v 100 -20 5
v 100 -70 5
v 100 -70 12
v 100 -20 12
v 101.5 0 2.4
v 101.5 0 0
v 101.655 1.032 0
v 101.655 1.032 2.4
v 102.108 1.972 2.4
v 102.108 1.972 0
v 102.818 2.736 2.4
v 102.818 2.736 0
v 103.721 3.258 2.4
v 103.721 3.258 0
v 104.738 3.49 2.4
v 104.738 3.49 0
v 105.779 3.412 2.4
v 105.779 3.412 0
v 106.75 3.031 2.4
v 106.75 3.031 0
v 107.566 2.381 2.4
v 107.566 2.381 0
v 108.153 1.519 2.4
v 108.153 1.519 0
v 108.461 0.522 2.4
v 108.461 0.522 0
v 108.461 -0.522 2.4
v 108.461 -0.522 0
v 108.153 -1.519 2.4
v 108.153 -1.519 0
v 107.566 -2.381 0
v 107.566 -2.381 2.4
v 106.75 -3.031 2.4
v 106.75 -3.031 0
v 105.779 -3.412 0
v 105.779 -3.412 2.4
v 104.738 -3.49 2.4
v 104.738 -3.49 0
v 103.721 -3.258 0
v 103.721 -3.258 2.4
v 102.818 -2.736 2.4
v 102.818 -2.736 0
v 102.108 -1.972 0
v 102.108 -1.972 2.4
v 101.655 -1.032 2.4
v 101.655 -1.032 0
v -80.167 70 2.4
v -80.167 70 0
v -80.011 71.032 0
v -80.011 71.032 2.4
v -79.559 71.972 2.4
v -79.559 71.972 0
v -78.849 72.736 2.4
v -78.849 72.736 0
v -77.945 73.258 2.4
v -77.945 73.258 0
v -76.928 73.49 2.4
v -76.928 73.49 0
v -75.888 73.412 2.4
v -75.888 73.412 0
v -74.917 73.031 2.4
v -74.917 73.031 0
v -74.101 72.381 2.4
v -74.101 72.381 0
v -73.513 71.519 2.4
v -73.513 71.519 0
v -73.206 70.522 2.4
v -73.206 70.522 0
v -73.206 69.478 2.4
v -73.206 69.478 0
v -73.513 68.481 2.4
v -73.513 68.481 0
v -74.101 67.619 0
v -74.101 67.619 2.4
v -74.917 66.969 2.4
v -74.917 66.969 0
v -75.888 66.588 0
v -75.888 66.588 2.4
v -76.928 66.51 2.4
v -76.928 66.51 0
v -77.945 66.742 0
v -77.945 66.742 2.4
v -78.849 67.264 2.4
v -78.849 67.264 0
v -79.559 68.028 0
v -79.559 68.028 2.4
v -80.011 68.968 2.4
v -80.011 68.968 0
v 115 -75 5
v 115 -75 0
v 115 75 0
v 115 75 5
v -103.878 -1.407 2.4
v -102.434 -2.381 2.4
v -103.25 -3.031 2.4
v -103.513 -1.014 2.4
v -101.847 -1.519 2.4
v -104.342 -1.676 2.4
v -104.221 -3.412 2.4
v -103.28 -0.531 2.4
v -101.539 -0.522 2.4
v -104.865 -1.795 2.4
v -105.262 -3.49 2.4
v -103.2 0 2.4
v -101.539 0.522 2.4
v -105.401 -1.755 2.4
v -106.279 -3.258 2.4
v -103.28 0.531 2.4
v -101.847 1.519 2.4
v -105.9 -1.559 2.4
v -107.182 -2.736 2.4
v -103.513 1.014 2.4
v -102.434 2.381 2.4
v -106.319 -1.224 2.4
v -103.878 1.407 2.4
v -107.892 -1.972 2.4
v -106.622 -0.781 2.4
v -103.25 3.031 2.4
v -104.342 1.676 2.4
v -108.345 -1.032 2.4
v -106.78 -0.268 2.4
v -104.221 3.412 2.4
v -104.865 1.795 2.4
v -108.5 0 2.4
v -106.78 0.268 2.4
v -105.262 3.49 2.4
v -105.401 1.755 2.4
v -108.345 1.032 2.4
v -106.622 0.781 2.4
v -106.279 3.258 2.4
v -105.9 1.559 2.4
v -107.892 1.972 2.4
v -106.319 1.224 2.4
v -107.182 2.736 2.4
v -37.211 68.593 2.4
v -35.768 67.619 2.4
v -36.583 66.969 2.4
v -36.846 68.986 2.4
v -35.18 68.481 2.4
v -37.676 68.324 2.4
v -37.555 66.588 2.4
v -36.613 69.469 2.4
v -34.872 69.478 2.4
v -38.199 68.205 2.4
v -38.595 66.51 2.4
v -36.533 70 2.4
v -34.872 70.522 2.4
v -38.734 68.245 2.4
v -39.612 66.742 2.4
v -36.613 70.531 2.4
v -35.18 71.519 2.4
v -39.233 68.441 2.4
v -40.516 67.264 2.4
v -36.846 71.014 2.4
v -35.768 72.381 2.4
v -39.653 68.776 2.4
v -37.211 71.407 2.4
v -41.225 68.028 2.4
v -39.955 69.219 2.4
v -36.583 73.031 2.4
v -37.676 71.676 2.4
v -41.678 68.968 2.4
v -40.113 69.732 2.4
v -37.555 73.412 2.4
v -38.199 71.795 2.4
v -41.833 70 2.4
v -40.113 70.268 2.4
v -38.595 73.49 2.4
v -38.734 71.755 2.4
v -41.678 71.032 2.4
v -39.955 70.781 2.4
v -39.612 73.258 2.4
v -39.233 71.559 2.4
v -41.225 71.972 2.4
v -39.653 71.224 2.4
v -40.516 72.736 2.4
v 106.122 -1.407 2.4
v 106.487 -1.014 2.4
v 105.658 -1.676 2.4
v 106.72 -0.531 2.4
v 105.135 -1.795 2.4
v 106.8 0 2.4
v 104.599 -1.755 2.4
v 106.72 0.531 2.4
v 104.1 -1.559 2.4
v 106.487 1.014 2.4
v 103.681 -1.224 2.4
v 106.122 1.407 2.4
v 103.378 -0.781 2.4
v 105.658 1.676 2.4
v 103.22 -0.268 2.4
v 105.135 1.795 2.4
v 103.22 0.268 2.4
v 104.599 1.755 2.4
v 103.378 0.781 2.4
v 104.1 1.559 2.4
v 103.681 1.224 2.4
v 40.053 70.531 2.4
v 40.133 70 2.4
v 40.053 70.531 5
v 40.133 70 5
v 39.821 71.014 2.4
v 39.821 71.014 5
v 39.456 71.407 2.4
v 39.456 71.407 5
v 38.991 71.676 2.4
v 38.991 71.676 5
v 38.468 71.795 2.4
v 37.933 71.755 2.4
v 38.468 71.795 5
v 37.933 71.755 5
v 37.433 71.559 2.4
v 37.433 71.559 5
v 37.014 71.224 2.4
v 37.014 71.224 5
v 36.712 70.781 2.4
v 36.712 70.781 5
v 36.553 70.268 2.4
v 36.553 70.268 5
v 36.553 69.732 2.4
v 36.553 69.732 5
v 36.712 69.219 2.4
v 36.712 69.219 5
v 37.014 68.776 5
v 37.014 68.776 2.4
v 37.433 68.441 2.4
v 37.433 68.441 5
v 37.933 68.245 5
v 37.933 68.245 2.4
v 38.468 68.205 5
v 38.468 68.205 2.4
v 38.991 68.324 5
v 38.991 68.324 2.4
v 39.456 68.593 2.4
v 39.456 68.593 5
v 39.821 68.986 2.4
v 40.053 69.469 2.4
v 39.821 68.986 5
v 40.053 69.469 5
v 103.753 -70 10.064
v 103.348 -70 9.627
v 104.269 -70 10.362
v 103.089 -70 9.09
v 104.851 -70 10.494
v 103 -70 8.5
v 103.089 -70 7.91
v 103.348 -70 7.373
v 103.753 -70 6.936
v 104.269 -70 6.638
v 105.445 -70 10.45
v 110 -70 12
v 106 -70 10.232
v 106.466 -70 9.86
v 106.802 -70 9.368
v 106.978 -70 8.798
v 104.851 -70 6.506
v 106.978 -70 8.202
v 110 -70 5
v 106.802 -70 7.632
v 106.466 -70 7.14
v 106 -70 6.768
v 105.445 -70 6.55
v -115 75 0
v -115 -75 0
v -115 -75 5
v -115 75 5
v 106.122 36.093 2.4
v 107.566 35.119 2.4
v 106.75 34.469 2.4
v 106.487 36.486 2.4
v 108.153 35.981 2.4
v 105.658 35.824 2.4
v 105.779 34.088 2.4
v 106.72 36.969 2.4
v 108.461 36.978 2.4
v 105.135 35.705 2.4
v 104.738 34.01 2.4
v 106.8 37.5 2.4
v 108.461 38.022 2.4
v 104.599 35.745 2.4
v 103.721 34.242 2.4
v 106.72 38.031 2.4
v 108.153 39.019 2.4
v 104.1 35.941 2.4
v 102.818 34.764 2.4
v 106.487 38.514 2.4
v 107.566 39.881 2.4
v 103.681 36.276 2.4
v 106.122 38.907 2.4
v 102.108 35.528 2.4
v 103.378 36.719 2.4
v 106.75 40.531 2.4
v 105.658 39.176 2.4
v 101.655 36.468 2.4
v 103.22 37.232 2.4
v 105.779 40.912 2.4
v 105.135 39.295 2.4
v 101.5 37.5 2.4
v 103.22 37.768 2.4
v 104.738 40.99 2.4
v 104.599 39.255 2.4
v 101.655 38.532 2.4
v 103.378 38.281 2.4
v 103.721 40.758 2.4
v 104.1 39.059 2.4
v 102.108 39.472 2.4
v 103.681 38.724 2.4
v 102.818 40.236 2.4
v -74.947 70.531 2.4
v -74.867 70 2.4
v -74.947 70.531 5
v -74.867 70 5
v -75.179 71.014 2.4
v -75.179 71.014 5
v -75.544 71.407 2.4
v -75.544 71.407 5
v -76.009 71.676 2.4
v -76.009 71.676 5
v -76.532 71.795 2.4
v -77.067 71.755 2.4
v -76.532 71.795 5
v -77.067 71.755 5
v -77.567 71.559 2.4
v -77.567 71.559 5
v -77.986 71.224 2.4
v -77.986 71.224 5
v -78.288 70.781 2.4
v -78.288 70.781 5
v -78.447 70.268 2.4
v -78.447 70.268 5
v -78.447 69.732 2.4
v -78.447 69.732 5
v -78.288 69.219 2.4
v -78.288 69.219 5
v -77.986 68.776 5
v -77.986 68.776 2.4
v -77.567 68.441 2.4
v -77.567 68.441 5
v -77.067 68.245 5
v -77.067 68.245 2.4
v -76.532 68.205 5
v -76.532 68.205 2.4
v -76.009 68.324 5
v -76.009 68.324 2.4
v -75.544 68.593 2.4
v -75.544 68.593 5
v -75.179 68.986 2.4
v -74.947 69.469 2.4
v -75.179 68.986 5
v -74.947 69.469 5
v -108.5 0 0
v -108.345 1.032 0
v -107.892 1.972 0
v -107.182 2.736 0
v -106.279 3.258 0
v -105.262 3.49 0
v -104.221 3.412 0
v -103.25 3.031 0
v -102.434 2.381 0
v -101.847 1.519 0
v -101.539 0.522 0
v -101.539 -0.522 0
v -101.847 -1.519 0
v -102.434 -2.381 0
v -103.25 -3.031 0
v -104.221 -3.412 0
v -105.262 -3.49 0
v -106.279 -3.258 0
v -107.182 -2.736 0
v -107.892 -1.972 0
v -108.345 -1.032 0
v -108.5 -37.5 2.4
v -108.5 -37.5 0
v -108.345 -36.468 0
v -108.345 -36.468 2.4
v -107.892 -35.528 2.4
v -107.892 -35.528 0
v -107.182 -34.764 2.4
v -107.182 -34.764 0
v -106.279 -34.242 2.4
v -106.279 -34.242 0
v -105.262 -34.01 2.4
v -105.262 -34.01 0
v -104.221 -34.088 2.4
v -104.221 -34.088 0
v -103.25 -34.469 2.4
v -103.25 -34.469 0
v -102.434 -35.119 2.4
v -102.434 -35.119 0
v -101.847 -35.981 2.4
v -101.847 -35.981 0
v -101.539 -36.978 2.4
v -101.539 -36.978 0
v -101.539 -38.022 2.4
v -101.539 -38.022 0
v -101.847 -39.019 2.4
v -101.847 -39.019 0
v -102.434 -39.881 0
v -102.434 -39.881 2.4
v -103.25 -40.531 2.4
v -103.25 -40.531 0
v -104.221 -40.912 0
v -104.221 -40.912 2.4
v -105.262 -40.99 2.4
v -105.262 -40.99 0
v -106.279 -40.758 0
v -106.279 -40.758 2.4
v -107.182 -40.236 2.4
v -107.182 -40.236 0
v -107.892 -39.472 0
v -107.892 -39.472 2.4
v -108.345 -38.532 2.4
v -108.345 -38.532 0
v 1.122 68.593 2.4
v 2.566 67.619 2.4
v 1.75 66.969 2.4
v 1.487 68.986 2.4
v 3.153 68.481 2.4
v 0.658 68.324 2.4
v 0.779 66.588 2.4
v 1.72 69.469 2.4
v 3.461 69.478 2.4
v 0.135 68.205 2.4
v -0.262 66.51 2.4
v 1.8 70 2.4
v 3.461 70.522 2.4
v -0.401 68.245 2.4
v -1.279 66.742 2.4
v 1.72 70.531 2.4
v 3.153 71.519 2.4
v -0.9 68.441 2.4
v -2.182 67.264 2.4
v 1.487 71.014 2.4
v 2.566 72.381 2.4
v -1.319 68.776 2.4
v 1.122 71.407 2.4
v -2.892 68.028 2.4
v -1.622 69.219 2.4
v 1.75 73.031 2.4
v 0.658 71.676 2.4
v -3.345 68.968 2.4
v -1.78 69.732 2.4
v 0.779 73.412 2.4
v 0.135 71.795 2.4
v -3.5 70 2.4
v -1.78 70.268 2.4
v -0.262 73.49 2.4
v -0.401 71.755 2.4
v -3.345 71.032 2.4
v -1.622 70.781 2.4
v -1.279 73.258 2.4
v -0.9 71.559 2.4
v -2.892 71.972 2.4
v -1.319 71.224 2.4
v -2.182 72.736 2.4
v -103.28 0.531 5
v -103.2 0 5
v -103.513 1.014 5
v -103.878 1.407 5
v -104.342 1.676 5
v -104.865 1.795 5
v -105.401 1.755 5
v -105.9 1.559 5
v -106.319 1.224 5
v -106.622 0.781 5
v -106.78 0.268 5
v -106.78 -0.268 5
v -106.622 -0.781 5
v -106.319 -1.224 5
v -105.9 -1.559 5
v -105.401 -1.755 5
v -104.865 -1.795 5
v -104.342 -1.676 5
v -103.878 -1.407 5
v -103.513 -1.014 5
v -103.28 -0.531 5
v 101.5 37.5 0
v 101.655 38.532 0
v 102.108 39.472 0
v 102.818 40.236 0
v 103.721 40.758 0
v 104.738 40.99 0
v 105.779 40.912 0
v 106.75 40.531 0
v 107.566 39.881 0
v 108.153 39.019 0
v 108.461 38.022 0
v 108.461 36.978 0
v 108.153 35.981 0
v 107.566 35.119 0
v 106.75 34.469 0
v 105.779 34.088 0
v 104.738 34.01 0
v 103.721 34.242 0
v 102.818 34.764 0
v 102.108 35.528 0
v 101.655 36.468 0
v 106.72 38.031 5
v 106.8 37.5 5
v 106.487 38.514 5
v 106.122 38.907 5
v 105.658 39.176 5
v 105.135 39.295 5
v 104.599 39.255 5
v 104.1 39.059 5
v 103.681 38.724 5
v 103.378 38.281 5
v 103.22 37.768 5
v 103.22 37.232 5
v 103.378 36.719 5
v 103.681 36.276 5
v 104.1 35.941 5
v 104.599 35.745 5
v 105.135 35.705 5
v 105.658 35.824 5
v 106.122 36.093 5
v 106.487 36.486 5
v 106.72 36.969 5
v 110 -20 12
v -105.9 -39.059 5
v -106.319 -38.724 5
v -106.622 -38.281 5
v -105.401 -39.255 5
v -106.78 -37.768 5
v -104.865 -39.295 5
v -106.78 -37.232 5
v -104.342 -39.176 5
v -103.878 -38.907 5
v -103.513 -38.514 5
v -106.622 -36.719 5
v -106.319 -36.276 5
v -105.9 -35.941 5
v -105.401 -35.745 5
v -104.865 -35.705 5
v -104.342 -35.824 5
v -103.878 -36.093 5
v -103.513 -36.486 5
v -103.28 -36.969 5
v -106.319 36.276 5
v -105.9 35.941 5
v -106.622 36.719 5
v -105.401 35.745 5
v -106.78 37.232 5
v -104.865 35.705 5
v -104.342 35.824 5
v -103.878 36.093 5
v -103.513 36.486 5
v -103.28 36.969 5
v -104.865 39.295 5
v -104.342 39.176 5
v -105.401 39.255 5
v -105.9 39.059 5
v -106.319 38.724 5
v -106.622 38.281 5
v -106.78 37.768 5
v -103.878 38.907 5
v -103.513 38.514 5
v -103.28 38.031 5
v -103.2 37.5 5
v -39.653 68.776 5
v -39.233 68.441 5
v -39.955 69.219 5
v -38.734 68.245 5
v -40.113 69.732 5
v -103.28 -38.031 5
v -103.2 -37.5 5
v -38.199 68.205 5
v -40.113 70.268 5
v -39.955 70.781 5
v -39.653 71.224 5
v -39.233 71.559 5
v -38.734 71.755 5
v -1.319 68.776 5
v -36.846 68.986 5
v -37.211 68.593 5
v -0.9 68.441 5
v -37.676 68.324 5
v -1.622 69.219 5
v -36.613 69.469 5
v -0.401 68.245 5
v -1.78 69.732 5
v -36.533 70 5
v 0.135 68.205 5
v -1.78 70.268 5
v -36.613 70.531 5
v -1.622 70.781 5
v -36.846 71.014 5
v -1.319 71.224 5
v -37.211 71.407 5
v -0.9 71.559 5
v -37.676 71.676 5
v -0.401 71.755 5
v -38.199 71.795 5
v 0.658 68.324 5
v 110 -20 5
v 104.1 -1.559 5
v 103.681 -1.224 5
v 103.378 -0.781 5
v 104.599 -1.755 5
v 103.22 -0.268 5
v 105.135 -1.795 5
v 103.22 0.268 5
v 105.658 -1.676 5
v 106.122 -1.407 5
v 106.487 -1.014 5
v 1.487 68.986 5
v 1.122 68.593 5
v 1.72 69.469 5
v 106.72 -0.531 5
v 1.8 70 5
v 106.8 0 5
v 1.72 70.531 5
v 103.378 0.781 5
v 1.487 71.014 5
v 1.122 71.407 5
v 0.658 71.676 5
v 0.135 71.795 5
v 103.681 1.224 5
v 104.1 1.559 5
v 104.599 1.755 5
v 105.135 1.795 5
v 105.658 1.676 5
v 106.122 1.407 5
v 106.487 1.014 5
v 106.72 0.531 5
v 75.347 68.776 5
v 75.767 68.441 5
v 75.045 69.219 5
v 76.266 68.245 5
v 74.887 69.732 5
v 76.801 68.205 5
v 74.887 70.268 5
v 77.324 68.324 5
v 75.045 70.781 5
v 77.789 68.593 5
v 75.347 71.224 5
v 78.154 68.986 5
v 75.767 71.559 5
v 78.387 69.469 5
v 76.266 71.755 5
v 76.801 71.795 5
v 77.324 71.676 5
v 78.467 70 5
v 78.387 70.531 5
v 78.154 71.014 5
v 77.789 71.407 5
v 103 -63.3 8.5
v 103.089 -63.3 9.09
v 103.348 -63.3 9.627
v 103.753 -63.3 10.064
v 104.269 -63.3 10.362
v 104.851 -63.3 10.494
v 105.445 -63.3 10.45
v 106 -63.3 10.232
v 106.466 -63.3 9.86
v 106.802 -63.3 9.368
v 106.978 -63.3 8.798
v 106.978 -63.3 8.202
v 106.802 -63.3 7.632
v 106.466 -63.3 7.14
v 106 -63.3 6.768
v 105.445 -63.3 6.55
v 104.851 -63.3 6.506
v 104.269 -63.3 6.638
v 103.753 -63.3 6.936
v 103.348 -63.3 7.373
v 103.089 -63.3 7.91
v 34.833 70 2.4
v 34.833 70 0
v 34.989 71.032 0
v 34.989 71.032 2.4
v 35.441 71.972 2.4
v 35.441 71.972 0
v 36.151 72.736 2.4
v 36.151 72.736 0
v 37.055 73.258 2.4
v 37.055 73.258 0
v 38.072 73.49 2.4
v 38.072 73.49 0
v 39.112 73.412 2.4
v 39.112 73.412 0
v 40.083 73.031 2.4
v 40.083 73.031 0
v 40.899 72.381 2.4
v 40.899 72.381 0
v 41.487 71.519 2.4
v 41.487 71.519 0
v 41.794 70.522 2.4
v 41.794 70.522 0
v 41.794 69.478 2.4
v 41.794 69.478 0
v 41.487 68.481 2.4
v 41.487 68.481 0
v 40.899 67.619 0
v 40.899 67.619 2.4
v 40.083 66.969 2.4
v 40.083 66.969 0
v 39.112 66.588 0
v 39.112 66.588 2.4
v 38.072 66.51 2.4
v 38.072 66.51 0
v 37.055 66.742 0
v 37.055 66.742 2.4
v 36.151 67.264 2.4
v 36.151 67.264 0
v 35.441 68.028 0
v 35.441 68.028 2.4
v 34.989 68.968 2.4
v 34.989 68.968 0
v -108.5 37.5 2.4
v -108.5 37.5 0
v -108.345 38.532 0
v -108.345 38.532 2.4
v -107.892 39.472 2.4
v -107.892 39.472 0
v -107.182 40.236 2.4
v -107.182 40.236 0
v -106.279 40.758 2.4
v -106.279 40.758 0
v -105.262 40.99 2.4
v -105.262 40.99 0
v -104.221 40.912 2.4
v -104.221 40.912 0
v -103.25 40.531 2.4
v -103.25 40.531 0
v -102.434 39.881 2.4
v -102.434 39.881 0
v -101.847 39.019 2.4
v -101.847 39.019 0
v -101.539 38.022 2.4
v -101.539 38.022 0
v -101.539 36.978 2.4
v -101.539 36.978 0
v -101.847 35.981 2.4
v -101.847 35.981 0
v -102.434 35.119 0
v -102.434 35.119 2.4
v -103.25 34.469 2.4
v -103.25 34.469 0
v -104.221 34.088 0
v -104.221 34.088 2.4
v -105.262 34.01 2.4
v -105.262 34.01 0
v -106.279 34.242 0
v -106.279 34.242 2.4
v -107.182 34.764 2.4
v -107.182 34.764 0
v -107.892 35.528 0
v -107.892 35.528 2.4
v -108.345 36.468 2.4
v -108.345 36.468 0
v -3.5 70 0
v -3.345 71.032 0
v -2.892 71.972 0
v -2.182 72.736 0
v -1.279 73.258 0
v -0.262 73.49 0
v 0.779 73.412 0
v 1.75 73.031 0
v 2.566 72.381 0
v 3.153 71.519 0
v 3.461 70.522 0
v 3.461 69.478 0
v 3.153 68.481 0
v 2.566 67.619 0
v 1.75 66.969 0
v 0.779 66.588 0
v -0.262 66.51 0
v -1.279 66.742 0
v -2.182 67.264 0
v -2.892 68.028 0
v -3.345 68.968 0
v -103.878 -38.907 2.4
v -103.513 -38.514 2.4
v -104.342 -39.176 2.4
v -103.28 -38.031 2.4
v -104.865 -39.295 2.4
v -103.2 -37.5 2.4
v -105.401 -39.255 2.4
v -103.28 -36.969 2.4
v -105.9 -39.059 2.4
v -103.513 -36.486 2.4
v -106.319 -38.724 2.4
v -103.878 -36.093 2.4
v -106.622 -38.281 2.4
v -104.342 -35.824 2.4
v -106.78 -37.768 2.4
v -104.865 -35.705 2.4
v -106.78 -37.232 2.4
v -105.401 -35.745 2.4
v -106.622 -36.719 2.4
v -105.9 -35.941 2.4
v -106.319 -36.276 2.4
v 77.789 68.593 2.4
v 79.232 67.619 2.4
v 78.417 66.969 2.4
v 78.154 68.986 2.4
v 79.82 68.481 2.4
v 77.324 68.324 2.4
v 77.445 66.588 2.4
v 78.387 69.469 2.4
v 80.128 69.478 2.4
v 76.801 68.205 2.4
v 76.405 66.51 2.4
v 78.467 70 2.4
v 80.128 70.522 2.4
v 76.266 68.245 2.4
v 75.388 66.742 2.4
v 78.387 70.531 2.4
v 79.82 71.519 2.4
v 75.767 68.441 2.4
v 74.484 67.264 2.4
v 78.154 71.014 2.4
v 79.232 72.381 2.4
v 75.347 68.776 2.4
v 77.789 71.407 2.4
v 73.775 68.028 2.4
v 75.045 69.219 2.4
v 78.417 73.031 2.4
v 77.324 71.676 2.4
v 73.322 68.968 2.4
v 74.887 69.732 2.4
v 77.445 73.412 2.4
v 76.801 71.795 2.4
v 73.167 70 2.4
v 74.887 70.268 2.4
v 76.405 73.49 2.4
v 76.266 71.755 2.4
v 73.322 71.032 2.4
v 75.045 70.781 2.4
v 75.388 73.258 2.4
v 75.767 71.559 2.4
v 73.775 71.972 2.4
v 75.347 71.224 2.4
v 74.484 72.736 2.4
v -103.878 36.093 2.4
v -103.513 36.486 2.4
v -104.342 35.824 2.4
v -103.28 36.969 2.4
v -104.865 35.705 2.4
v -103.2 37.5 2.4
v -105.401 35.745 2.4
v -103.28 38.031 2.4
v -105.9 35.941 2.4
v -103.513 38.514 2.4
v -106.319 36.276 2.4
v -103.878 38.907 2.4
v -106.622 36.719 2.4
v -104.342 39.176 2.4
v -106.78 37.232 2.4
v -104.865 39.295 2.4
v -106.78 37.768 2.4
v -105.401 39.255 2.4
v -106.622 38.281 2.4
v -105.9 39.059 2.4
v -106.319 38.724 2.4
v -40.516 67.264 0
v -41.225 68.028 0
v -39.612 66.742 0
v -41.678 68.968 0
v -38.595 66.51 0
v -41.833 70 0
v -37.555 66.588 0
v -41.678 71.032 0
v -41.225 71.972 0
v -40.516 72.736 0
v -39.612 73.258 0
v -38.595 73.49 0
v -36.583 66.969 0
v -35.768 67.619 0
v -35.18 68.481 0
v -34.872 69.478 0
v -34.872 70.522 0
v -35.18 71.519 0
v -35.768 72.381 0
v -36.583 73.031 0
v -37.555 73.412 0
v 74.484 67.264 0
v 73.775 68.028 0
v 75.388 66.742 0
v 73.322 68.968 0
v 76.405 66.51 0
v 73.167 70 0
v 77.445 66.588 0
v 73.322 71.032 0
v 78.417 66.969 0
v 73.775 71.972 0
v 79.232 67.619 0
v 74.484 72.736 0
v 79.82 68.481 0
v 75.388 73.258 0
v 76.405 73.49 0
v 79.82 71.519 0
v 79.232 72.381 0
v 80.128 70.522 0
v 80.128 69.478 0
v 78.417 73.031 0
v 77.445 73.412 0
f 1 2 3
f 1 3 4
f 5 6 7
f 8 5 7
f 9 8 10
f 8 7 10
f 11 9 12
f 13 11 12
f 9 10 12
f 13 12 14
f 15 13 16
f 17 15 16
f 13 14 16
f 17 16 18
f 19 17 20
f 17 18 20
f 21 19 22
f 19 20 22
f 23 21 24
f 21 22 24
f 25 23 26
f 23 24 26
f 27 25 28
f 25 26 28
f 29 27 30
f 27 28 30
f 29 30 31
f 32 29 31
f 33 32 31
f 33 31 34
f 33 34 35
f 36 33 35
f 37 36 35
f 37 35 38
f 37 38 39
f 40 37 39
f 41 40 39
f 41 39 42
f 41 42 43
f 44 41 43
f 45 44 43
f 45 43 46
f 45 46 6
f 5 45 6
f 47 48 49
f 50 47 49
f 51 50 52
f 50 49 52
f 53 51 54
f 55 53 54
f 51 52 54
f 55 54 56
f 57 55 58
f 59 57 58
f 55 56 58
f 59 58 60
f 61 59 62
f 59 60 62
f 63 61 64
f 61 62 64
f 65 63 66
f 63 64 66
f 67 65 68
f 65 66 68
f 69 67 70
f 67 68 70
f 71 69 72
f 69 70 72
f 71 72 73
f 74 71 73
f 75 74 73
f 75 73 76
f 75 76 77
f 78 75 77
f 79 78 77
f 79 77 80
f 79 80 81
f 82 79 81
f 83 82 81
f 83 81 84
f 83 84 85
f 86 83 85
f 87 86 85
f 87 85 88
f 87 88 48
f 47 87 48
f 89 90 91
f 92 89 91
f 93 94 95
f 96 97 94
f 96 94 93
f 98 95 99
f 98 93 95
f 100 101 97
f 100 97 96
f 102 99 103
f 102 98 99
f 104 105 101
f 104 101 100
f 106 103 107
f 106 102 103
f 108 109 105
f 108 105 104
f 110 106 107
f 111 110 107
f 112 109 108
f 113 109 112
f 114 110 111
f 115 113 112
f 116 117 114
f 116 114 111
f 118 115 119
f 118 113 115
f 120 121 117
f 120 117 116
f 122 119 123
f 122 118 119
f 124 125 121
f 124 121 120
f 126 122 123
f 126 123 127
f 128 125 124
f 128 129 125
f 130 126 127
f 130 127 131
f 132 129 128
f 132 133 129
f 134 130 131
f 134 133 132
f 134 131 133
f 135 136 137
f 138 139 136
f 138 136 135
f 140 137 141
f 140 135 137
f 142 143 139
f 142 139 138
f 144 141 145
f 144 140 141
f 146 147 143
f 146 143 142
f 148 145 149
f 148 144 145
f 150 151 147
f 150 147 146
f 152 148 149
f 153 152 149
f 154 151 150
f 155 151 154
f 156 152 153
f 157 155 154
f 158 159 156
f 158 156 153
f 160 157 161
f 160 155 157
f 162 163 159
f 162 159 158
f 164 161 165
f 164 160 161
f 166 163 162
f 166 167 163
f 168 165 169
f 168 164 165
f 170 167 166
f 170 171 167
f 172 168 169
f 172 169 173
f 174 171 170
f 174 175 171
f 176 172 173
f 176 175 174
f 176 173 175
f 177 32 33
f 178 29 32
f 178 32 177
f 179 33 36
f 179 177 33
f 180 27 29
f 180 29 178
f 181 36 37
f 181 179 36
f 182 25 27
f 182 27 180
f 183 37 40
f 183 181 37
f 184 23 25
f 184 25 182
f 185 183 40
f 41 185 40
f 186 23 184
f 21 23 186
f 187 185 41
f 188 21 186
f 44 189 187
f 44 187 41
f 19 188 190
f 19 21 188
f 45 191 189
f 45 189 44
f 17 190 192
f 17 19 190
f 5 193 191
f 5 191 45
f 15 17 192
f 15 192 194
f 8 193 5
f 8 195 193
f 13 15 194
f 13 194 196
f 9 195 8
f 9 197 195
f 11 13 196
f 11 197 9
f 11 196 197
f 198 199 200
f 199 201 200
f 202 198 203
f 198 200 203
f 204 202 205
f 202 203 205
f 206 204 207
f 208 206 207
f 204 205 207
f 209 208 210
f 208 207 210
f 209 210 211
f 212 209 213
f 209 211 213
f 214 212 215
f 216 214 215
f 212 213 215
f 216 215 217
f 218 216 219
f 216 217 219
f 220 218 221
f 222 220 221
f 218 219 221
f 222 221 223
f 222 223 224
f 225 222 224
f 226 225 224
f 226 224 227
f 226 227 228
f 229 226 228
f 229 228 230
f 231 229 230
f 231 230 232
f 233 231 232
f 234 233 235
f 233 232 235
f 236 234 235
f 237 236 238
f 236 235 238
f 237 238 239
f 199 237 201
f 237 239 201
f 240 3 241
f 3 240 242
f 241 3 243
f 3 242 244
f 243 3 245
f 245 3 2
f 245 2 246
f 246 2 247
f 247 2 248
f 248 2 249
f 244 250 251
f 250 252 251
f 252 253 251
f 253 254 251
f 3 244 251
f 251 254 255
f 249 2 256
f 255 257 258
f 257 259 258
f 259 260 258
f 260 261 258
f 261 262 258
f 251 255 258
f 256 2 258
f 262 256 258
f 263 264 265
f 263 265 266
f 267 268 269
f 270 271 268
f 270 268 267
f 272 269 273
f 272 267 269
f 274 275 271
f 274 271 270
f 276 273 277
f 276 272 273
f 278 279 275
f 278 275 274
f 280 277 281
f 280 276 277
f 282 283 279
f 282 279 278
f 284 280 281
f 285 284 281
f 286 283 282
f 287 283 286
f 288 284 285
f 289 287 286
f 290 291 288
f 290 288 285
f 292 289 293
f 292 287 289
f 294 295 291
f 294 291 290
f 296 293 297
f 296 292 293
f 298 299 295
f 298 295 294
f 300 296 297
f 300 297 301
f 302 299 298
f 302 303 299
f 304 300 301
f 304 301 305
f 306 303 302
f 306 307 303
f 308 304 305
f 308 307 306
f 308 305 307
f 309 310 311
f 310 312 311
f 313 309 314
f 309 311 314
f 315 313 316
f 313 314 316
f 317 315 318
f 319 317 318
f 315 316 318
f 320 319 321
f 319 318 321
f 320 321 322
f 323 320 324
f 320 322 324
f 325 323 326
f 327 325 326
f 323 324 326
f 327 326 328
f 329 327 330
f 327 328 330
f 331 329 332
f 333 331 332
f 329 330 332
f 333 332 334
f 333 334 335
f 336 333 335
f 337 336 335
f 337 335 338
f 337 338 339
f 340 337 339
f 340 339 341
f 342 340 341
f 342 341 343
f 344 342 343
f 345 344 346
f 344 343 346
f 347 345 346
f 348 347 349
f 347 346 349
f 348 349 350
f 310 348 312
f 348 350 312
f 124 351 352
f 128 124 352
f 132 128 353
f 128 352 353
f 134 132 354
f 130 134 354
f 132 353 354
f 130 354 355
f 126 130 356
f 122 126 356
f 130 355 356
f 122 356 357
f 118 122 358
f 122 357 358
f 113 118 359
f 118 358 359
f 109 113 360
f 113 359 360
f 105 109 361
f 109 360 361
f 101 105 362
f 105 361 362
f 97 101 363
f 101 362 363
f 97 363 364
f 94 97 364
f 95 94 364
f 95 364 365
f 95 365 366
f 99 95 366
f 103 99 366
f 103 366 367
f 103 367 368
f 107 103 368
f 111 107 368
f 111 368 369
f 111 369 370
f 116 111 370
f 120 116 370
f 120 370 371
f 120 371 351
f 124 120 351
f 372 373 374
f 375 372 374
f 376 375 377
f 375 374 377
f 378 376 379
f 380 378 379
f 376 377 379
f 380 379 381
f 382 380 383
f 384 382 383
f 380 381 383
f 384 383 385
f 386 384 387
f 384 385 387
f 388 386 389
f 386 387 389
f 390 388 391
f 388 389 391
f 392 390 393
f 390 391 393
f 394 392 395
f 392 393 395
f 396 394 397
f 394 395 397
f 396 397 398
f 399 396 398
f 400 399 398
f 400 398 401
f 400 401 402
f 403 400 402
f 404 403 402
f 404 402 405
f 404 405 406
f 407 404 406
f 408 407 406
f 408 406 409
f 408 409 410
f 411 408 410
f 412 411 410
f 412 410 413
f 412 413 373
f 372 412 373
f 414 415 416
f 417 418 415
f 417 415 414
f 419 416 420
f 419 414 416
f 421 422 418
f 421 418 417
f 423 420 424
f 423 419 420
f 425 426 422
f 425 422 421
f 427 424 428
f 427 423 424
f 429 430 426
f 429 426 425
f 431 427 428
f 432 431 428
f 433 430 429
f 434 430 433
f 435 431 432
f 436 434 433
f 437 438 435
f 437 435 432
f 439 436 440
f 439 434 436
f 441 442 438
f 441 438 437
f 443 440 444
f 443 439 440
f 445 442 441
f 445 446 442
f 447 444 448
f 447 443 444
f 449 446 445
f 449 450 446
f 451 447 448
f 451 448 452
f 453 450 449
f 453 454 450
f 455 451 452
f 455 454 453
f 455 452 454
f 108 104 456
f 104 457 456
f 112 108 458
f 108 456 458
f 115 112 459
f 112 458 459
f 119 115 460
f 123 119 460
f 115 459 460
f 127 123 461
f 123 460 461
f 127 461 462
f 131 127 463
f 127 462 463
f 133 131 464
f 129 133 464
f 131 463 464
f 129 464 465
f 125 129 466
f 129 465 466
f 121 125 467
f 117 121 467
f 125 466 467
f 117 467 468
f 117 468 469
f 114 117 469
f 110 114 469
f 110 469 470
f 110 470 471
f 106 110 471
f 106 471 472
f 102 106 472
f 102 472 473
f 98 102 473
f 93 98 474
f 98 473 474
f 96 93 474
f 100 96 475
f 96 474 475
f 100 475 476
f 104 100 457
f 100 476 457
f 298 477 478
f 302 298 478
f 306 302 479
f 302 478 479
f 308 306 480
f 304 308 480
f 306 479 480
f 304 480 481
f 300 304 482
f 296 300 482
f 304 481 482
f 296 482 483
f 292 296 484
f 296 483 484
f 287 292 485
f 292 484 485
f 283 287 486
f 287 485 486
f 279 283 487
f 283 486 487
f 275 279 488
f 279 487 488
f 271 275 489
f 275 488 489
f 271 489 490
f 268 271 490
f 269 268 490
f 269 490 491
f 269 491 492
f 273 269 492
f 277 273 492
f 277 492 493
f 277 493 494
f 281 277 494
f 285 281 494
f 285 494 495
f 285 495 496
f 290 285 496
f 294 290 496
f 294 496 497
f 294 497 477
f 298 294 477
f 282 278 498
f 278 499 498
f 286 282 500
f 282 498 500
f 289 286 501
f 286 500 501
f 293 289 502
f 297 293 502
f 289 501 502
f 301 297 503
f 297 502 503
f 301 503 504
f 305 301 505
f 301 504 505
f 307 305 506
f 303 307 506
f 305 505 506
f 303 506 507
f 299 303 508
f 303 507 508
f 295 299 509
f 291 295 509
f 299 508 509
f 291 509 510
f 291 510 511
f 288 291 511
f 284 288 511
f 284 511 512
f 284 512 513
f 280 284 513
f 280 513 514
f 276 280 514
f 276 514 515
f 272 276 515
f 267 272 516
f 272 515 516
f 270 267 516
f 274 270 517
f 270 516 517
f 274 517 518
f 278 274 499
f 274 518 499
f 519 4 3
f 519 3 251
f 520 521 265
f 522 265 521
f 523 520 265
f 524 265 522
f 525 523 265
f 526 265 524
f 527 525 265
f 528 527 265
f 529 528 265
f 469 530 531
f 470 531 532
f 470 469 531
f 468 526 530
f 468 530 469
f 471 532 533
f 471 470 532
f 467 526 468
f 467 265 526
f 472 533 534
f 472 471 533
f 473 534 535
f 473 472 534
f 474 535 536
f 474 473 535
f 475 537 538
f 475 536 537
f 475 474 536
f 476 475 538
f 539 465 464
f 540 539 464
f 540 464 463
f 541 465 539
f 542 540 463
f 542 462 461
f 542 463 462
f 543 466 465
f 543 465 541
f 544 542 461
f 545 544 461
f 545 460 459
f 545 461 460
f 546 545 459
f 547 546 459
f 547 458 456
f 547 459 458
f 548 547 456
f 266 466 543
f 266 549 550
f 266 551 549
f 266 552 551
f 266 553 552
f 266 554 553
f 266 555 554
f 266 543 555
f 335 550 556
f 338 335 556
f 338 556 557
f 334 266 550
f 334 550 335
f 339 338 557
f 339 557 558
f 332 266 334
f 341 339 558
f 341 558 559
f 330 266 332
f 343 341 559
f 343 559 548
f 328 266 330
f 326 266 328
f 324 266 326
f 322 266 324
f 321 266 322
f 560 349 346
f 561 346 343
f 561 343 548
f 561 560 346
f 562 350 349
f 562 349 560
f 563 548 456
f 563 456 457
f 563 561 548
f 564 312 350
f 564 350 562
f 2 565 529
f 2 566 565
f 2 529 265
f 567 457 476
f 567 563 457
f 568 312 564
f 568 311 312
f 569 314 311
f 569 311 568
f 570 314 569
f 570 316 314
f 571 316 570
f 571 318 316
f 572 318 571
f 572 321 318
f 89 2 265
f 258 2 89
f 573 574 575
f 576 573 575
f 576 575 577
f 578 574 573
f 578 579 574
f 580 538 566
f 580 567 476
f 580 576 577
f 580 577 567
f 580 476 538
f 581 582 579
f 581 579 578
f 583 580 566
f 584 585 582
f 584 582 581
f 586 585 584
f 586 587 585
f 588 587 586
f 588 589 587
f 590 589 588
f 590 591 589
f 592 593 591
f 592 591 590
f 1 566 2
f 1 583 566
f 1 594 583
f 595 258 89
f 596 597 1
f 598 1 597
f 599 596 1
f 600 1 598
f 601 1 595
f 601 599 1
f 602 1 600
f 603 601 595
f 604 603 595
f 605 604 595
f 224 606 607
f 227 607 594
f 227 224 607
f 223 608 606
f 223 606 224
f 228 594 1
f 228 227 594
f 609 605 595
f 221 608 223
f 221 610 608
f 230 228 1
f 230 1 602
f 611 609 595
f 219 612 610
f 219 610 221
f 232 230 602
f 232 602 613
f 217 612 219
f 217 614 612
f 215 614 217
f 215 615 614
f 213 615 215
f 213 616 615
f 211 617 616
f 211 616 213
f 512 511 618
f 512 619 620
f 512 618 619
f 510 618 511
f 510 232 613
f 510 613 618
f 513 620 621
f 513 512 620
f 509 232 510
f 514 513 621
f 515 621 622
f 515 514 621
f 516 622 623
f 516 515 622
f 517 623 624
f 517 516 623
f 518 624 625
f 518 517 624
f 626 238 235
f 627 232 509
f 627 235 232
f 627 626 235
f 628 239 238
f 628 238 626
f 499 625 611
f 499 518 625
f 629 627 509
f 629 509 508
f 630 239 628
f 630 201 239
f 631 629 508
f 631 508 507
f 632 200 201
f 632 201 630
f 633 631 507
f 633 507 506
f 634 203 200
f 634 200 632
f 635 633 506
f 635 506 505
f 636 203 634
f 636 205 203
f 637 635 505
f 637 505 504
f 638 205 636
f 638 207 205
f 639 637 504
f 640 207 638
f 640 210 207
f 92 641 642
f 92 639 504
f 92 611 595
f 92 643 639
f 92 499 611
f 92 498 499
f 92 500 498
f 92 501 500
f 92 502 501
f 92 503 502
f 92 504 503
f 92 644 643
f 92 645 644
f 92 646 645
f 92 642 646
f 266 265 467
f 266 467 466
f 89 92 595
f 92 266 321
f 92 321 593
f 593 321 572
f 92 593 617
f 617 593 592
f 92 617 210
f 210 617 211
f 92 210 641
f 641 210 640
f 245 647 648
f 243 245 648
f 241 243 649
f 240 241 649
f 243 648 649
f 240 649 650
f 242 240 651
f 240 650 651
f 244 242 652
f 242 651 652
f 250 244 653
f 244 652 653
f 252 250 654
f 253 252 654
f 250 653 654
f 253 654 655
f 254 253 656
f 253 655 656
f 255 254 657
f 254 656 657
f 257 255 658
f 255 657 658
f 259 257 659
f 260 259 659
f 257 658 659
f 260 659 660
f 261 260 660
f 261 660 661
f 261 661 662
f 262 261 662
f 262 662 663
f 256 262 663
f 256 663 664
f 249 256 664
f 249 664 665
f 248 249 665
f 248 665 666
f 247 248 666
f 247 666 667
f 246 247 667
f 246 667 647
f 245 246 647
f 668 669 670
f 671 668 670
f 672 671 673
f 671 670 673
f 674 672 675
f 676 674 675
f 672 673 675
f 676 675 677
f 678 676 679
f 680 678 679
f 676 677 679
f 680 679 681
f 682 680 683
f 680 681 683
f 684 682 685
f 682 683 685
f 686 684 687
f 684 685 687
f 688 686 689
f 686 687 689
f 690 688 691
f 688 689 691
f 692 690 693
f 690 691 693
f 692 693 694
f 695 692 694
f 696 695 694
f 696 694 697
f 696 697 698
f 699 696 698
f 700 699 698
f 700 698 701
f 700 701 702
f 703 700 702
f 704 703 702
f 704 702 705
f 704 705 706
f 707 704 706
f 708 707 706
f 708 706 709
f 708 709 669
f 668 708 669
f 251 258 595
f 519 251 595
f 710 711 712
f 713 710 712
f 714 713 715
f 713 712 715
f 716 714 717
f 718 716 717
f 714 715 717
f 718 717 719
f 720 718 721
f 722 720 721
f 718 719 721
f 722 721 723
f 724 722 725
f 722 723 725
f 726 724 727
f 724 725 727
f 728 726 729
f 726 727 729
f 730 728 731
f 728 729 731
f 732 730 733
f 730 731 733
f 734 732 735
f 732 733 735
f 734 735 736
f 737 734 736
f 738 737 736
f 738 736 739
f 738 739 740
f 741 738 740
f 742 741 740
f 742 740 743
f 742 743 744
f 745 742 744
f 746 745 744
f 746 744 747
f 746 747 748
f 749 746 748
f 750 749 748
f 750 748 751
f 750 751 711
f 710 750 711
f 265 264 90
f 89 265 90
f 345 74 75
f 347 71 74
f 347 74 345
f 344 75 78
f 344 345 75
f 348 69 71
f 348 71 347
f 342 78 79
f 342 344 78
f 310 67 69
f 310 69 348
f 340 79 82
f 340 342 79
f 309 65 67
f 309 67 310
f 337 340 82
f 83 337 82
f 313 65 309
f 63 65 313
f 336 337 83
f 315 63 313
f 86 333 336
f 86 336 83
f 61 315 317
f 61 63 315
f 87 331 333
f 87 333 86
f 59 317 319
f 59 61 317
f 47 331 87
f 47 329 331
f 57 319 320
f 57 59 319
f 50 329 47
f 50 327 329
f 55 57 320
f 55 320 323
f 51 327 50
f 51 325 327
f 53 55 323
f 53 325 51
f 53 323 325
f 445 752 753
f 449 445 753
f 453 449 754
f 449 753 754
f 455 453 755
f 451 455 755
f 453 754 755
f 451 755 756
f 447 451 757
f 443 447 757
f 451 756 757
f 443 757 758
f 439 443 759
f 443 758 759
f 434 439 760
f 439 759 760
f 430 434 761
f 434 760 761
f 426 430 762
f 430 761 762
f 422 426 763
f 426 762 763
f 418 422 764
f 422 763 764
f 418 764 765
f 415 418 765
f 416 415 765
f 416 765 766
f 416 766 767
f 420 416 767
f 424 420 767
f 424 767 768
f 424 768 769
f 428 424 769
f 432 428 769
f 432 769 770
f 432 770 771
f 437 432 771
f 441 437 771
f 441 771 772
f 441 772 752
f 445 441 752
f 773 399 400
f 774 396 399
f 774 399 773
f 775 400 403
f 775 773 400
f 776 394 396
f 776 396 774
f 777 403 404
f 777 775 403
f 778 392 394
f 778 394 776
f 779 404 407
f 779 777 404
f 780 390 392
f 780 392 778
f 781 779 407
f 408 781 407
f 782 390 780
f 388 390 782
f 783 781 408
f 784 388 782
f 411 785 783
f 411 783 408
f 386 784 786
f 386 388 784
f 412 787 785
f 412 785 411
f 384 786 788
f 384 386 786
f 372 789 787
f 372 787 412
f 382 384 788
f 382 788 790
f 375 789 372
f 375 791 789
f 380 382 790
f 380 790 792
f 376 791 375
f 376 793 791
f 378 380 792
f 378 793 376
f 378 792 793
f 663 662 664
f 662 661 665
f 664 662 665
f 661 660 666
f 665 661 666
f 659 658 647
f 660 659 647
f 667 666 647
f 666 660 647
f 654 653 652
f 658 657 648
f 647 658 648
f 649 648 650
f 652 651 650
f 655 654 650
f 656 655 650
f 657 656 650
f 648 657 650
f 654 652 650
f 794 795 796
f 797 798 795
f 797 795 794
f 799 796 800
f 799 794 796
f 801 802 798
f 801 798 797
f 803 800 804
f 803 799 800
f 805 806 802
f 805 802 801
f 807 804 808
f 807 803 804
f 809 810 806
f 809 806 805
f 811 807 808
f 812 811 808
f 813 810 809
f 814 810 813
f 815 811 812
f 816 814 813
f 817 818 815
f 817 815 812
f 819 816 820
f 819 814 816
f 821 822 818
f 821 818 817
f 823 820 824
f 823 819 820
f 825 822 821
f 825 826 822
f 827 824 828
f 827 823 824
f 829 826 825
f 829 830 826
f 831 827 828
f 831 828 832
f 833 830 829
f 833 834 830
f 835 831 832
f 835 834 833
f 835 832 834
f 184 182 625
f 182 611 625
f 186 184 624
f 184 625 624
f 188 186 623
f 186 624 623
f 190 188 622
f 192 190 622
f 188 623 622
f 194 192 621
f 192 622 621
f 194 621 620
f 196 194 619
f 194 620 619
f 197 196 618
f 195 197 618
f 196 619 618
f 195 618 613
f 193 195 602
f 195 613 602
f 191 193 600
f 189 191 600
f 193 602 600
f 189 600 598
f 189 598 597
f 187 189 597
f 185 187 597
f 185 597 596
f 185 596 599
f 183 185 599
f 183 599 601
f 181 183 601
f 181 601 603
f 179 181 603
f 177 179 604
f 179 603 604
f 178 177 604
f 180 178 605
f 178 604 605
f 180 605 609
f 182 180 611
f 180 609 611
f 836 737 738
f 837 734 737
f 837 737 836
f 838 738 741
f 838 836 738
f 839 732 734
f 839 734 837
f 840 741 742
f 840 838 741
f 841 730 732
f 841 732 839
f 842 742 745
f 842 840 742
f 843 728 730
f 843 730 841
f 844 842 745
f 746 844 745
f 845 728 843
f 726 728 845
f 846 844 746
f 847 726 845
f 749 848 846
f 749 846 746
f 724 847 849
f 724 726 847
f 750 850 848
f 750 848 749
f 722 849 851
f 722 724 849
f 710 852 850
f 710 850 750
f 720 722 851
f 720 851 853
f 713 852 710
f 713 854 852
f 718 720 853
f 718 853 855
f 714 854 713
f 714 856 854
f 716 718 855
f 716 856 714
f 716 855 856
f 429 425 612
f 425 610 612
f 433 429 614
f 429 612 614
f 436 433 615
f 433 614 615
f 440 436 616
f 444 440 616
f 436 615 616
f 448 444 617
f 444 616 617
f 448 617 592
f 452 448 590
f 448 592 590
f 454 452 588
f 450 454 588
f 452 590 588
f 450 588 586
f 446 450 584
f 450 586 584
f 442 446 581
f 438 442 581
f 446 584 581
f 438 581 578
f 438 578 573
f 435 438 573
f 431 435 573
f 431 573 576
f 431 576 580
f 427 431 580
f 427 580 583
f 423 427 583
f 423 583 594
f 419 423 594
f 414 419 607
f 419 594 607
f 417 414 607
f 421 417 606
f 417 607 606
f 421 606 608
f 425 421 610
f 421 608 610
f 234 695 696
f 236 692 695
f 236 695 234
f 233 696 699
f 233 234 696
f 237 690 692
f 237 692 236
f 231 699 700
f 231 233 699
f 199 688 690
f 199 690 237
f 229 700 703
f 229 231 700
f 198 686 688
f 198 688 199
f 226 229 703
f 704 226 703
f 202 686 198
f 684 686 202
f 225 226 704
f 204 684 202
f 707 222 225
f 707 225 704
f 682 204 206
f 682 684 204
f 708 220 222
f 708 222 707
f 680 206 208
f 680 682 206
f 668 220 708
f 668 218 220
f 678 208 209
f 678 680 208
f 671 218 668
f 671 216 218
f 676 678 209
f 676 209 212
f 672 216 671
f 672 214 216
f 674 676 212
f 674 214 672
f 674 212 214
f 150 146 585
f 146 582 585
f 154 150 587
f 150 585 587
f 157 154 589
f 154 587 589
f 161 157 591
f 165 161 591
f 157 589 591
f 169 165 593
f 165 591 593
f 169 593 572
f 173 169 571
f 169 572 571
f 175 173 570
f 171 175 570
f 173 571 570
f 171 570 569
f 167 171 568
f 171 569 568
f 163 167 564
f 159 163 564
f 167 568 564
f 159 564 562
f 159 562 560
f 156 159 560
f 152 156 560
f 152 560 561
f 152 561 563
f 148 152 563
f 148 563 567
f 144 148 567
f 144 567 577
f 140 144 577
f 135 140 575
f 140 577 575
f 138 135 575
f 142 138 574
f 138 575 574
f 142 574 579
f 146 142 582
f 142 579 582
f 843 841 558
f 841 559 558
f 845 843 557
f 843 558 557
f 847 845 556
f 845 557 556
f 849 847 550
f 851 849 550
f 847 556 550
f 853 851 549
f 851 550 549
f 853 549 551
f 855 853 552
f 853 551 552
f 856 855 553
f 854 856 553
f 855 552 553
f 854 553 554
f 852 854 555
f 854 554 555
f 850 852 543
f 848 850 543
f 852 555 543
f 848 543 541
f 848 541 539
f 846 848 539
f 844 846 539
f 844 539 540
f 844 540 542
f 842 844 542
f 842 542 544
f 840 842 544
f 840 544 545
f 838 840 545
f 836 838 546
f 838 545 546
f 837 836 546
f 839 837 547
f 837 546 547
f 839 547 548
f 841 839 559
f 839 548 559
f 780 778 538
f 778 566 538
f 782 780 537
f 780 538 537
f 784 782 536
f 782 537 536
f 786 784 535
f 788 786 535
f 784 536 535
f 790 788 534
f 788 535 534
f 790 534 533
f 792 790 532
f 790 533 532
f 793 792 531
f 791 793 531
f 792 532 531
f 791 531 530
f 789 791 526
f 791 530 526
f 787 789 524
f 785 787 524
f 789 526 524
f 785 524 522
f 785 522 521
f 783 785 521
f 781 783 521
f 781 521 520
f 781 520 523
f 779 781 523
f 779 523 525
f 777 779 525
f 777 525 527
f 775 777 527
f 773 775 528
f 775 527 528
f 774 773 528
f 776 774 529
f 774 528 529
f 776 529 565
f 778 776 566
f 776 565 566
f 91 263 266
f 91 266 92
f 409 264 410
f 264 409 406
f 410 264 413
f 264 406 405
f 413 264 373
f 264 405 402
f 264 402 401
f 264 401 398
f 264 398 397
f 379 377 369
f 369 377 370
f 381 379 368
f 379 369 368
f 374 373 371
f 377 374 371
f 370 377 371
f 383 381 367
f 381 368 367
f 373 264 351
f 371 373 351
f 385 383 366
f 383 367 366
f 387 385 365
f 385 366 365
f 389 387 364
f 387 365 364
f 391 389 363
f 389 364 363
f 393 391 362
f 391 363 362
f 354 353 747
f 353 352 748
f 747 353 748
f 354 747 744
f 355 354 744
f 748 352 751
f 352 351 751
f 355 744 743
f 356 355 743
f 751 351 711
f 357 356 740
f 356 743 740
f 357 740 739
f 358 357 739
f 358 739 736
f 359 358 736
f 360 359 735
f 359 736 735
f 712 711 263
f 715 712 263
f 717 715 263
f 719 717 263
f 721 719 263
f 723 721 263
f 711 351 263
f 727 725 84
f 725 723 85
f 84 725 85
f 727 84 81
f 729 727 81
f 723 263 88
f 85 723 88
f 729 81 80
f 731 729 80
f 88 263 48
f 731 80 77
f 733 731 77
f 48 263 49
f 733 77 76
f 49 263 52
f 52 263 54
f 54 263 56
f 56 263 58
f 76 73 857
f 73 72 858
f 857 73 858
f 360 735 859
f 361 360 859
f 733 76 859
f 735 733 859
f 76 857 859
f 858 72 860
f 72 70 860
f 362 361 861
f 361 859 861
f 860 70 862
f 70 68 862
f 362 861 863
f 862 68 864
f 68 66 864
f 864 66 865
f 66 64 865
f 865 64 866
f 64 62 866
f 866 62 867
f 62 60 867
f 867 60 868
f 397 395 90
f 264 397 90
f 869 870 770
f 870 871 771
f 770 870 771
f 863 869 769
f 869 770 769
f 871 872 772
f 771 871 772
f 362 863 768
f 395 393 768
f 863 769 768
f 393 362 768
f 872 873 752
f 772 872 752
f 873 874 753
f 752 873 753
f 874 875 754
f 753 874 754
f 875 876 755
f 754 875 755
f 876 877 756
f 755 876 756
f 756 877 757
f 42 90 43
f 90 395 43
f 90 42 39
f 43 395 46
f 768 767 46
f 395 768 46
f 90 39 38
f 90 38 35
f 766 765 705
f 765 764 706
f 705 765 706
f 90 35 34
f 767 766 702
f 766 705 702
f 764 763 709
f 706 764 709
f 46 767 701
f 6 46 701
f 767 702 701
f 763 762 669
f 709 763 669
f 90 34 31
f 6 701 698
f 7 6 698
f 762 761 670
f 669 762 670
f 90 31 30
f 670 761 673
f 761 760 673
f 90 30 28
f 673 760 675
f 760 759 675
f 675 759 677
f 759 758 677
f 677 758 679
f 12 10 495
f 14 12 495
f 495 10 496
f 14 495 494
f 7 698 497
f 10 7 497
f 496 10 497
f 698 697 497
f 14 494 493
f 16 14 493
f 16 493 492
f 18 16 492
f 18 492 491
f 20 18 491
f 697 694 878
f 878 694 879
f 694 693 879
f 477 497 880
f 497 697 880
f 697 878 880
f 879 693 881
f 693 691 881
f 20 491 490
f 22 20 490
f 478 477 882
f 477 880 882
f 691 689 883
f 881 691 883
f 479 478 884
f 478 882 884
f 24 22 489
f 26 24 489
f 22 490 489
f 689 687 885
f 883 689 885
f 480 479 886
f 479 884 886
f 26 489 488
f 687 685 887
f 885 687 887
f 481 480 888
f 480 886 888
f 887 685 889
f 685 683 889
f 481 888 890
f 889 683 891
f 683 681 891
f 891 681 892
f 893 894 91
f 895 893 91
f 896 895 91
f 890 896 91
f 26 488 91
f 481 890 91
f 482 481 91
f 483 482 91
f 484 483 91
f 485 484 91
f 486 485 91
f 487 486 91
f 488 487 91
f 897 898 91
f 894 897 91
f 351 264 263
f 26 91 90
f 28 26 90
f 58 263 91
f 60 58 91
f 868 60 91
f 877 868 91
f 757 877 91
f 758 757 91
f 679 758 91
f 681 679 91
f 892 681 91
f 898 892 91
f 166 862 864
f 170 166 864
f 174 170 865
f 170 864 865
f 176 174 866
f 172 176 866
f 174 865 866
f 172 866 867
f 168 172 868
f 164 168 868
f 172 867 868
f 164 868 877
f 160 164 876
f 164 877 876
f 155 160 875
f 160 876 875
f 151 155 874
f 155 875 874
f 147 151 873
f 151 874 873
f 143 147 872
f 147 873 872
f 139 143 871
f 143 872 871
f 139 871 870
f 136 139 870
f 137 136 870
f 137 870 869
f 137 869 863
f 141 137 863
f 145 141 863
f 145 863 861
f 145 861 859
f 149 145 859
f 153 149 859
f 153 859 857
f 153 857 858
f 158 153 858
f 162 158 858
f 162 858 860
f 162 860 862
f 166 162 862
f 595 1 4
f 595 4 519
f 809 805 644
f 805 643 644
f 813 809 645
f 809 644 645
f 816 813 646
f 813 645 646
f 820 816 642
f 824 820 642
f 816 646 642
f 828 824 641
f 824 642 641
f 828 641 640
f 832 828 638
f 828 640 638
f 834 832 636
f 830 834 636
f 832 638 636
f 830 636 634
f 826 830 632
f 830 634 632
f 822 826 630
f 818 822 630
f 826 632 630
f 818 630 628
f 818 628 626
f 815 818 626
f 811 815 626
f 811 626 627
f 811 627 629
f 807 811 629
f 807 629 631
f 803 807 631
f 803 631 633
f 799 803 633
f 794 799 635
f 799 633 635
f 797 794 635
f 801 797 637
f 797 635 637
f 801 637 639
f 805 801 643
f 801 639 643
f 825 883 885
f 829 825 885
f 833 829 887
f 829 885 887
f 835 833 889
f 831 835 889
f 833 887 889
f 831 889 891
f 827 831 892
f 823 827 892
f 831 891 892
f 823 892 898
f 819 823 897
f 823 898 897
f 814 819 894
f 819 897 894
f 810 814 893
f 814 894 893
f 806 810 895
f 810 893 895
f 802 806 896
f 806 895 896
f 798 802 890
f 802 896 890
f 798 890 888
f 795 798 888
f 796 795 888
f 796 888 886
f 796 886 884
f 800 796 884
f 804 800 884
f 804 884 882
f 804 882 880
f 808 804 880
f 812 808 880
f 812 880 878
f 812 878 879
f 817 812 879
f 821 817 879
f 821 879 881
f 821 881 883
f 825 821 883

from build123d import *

# Parameters (mm, degrees)
SZKIC1_W                                          = 230
SZKIC1_H                                          = 150
DODANIE_WYCI_GNI_CIE1_DEPTH                       = 5
POG_BIENIE_WALCOWE_POD_M3_RUB_Z_BEM_S_D           = 3.6
POG_BIENIE_WALCOWE_POD_M3_RUB_Z_BEM_S_DEPTH       = 6.7
POG_BIENIE_WALCOWE_POD_M3_RUB_Z_BEM_S_CBORE_D     = 7
POG_BIENIE_WALCOWE_POD_M3_RUB_Z_BEM_S_CBORE_DEPTH = 2.4
POG_BIENIE_WALCOWE_POD_M3_RUB_Z_BEM_S_TIP         = 1.081549114
POG_BIENIE_WALCOWE_POD_M3_RUB_Z_B_2_D             = 3.6
POG_BIENIE_WALCOWE_POD_M3_RUB_Z_B_2_DEPTH         = 6.7
POG_BIENIE_WALCOWE_POD_M3_RUB_Z_B_2_CBORE_D       = 7
POG_BIENIE_WALCOWE_POD_M3_RUB_Z_B_2_CBORE_DEPTH   = 2.4
POG_BIENIE_WALCOWE_POD_M3_RUB_Z_B_2_TIP           = 1.081549114
SZKIC7_W                                          = 10
SZKIC7_H                                          = 50
DODANIE_WYCI_GNI_CIE3_DEPTH                       = 7
OTWORY_USTALAJ_CE_4_0MM1_D                        = 4
OTWORY_USTALAJ_CE_4_0MM1_DEPTH                    = 6.7


with BuildPart() as part:
    # Szkic1 → Dodanie-wyciągnięcie1 (new body)
    with BuildSketch(Plane.XY):
        Rectangle(SZKIC1_W, SZKIC1_H)
    extrude(amount=DODANIE_WYCI_GNI_CIE1_DEPTH)

    # Pog_bienie walcowe pod M3 _rub_ z _bem s
    with Locations(Plane(origin=(0, 0, 0), x_dir=(-1, 0, 0), z_dir=(0, 0, -1))):
        with Locations((105, 37.5), (105, 0), (105, -37.5), (-105, 0), (-105, 37.5)):
            CounterBoreHole(POG_BIENIE_WALCOWE_POD_M3_RUB_Z_BEM_S_D / 2, POG_BIENIE_WALCOWE_POD_M3_RUB_Z_BEM_S_CBORE_D / 2, POG_BIENIE_WALCOWE_POD_M3_RUB_Z_BEM_S_CBORE_DEPTH, depth=POG_BIENIE_WALCOWE_POD_M3_RUB_Z_BEM_S_DEPTH)
            with Locations((0, 0, -(POG_BIENIE_WALCOWE_POD_M3_RUB_Z_BEM_S_DEPTH + POG_BIENIE_WALCOWE_POD_M3_RUB_Z_BEM_S_TIP / 2))):  # 118° drill point
                Cone(0, POG_BIENIE_WALCOWE_POD_M3_RUB_Z_BEM_S_D / 2, POG_BIENIE_WALCOWE_POD_M3_RUB_Z_BEM_S_TIP, mode=Mode.SUBTRACT)

    # Pog_bienie walcowe pod M3 _rub_ z _b 2
    with Locations(Plane(origin=(0, 0, 0), x_dir=(-1, 0, 0), z_dir=(0, 0, -1))):
        with Locations((-76.666666667, 70), (-38.333333337, 70), (-7e-09, 70), (38.333333323, 70), (76.666666653, 70)):
            CounterBoreHole(POG_BIENIE_WALCOWE_POD_M3_RUB_Z_B_2_D / 2, POG_BIENIE_WALCOWE_POD_M3_RUB_Z_B_2_CBORE_D / 2, POG_BIENIE_WALCOWE_POD_M3_RUB_Z_B_2_CBORE_DEPTH, depth=POG_BIENIE_WALCOWE_POD_M3_RUB_Z_B_2_DEPTH)
            with Locations((0, 0, -(POG_BIENIE_WALCOWE_POD_M3_RUB_Z_B_2_DEPTH + POG_BIENIE_WALCOWE_POD_M3_RUB_Z_B_2_TIP / 2))):  # 118° drill point
                Cone(0, POG_BIENIE_WALCOWE_POD_M3_RUB_Z_B_2_D / 2, POG_BIENIE_WALCOWE_POD_M3_RUB_Z_B_2_TIP, mode=Mode.SUBTRACT)

    # Szkic7 → Dodanie-wyciągnięcie3 (add)
    with BuildSketch(Plane.XY.offset(5)):
        with Locations((105, -45)):
            Rectangle(SZKIC7_W, SZKIC7_H)
    extrude(amount=DODANIE_WYCI_GNI_CIE3_DEPTH)

    # Otwory ustalające Ø4.0mm1
    with Locations(Plane.XZ.offset(70)):
        with Locations((105, 8.5)):
            Hole(OTWORY_USTALAJ_CE_4_0MM1_D / 2, depth=OTWORY_USTALAJ_CE_4_0MM1_DEPTH)


solid = part.part
